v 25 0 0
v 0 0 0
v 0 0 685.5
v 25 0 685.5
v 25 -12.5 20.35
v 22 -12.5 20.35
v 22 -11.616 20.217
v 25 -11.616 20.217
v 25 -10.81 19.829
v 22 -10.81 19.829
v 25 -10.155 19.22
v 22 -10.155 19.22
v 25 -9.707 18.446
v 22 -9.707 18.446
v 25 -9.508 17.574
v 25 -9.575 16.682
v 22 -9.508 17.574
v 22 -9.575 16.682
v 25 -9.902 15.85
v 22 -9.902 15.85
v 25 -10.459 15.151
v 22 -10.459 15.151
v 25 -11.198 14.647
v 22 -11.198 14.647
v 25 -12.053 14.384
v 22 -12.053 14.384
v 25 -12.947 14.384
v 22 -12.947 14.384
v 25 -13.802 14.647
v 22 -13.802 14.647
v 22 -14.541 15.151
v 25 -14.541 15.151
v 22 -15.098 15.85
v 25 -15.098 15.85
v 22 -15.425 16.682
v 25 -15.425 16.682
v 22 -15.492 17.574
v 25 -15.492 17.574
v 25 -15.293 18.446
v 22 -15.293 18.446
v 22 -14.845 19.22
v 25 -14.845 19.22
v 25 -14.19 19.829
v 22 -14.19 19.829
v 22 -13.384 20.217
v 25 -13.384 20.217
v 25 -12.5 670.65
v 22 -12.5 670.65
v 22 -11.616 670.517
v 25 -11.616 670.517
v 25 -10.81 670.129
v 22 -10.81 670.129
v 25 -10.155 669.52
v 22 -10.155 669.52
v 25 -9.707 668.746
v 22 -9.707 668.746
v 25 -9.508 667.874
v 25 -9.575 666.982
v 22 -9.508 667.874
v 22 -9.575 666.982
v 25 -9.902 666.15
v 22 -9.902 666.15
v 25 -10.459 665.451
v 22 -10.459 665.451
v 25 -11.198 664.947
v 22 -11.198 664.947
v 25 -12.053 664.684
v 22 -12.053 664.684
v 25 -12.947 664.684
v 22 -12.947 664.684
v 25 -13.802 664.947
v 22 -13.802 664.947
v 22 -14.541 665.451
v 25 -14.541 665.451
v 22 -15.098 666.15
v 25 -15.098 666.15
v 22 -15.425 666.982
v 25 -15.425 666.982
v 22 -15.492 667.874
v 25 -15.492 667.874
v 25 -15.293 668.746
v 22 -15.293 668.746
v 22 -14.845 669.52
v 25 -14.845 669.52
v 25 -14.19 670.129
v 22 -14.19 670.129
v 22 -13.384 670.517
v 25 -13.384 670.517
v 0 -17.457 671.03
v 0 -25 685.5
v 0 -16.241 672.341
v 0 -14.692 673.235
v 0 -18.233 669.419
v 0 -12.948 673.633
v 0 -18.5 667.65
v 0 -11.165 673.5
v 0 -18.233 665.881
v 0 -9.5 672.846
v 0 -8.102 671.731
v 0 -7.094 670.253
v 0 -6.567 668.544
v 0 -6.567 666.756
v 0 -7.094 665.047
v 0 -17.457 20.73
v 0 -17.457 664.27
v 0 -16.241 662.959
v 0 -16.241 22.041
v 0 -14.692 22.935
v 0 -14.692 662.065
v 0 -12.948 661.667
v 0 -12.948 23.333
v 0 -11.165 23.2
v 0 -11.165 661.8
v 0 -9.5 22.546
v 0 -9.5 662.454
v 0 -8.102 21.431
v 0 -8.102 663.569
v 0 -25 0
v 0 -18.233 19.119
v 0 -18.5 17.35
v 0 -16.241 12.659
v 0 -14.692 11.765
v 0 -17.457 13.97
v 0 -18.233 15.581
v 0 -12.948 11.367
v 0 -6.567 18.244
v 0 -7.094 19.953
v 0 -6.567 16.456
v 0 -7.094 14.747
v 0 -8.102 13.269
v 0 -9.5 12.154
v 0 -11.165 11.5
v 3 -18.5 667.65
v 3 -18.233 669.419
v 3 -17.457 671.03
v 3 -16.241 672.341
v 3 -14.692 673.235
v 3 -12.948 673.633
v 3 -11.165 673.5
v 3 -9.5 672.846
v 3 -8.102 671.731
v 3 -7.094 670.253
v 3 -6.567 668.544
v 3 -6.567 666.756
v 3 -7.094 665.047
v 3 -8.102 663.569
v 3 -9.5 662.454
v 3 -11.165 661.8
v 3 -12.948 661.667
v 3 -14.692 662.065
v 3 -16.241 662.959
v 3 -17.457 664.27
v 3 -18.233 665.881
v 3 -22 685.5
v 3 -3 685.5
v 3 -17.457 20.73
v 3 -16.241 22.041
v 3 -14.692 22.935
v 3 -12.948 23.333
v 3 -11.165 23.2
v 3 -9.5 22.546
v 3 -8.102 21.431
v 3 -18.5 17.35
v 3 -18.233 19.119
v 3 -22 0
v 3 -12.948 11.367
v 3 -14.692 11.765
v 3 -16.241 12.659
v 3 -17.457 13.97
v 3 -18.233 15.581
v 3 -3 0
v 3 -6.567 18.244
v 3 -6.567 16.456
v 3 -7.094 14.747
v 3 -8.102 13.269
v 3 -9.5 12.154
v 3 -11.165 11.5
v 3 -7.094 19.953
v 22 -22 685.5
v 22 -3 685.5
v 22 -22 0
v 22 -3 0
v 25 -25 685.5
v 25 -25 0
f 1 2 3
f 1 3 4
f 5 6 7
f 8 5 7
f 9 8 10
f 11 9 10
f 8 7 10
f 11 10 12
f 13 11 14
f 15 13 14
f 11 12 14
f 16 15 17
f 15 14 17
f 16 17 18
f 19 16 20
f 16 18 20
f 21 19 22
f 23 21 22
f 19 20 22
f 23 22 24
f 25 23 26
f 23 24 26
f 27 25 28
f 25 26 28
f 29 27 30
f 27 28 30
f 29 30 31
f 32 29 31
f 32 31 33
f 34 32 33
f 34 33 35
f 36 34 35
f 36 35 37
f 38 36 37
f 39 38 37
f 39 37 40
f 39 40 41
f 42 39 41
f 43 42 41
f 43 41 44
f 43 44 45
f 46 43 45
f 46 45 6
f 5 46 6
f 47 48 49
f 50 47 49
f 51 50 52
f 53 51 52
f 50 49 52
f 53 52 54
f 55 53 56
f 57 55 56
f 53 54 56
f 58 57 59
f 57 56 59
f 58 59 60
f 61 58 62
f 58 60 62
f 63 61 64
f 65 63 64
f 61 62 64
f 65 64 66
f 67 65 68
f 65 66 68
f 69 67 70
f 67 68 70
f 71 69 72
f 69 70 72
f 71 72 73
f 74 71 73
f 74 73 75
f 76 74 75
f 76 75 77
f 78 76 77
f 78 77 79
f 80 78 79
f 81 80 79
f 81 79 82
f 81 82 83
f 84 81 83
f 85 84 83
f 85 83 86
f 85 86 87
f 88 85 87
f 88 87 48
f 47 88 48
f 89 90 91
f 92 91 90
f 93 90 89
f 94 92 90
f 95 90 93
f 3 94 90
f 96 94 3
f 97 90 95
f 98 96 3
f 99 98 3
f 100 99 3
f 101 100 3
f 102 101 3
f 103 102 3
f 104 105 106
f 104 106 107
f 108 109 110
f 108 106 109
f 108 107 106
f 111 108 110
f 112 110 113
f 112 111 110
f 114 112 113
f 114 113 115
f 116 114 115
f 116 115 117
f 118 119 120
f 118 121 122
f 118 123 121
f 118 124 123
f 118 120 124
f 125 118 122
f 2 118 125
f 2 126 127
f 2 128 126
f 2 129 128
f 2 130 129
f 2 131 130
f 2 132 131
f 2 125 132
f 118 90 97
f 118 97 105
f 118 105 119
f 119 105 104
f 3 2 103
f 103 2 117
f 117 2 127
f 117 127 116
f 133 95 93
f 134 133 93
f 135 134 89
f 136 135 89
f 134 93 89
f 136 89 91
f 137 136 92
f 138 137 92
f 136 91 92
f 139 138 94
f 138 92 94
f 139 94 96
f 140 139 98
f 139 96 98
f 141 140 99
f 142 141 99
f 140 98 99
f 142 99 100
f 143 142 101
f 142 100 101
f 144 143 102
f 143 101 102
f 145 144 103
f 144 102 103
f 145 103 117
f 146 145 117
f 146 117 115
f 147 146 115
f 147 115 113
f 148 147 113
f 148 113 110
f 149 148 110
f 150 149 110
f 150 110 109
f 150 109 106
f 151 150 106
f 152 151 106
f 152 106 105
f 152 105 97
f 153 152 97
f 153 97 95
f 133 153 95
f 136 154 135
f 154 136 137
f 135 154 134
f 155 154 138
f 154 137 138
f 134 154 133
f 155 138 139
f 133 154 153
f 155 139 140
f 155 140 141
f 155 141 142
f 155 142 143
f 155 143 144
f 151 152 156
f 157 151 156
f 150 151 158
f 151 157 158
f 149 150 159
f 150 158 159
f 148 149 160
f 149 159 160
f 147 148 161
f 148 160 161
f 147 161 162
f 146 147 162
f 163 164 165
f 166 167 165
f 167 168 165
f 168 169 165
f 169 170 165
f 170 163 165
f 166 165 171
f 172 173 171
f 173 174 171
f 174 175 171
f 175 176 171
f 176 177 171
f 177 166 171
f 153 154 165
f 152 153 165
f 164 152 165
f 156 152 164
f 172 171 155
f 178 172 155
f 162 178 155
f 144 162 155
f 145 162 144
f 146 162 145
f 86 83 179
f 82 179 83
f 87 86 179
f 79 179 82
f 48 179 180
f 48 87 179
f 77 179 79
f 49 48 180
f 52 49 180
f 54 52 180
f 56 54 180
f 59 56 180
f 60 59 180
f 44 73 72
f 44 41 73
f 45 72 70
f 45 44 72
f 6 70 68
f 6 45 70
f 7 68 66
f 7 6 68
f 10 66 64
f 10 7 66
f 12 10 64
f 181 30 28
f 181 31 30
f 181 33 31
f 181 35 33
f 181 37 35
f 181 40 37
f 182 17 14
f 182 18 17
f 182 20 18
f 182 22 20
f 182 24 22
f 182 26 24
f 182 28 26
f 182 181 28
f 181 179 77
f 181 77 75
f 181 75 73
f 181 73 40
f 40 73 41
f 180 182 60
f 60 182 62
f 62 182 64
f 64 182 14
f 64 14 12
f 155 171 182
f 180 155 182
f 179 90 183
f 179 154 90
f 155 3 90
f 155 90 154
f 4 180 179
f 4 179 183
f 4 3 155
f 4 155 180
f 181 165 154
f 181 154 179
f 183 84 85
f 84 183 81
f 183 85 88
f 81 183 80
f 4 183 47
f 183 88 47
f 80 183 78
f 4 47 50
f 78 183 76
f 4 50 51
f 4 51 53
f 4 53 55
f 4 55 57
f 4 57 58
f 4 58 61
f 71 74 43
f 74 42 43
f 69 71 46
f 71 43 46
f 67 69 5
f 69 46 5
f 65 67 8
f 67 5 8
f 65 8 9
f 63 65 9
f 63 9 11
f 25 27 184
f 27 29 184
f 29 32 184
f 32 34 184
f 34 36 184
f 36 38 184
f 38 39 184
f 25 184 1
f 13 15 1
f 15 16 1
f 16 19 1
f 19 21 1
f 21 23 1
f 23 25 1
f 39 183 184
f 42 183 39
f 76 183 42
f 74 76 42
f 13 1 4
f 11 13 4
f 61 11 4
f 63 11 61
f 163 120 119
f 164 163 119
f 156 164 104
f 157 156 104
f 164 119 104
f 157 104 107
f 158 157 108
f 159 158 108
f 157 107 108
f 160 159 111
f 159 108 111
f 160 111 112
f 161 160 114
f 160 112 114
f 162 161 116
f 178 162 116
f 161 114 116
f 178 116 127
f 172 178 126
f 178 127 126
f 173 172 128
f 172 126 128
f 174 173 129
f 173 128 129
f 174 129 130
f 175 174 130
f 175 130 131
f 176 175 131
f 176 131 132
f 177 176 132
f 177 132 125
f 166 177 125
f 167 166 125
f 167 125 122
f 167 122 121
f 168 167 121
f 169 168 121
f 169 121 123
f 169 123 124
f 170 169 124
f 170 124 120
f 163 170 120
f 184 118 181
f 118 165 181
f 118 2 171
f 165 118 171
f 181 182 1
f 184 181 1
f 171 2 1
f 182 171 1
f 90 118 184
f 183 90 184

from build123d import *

# Parameters (mm, degrees)
SKETCH_1_W             = 25
SKETCH_1_H             = 25
SKETCH_1_W_2           = 19
SKETCH_1_H_2           = 19
EXTRUDE_1_DEPTH        = 685.5
HOLE_WIZARD_6_0_6_1_D  = 6
CUT_EXTRUDE_1_REACH    = 688.411
SKETCH_5_R             = 6
PATTERN_LINEAR_1_COUNT = 2
PATTERN_LINEAR_1_PITCH = 650.3


with BuildPart() as part:
    # 草图1 → 拉伸1 (new body)
    with BuildSketch(Plane.XY):
        with Locations((12.5, -12.5)):
            Rectangle(SKETCH_1_W, SKETCH_1_H)
        with Locations((12.5, -12.5)):
            Rectangle(SKETCH_1_W_2, SKETCH_1_H_2, mode=Mode.SUBTRACT)
    extrude(amount=EXTRUDE_1_DEPTH)

    # Ø6.0 (6) 直径孔1 (through all)
    with Locations(Plane(origin=(25, 0, 0), x_dir=(0, 0, -1), z_dir=(1, 0, 0))):
        with Locations((-667.65, -12.5)):
            hole_wizard_6_0_6_1 = Hole(HOLE_WIZARD_6_0_6_1_D / 2)

    # 草图5 → 切除-拉伸1 (cut, up to next)
    with BuildSketch(Plane.ZY, mode=Mode.PRIVATE) as cut_extrude_1_sk1:
        with Locations(Location((667.65, -12.5, 0), (0, 0, 270))):
            Circle(SKETCH_5_R)
    cut_extrude_1_tool1 = extrude(cut_extrude_1_sk1.sketch, amount=-CUT_EXTRUDE_1_REACH, mode=Mode.PRIVATE) & part.part
    cut_extrude_1 = cut_extrude_1_tool1.solids().sort_by_distance((0, -12.5, 667.65))[0]
    add(cut_extrude_1, mode=Mode.SUBTRACT)

    # 阵列(线性)1: Ø6.0 (6) 直径孔1, 切除-拉伸1 ×2
    with Locations(*[(0, 0, -i * PATTERN_LINEAR_1_PITCH) for i in range(1, PATTERN_LINEAR_1_COUNT)]):
        add(hole_wizard_6_0_6_1, mode=Mode.SUBTRACT)
        add(cut_extrude_1, mode=Mode.SUBTRACT)


solid = part.part
